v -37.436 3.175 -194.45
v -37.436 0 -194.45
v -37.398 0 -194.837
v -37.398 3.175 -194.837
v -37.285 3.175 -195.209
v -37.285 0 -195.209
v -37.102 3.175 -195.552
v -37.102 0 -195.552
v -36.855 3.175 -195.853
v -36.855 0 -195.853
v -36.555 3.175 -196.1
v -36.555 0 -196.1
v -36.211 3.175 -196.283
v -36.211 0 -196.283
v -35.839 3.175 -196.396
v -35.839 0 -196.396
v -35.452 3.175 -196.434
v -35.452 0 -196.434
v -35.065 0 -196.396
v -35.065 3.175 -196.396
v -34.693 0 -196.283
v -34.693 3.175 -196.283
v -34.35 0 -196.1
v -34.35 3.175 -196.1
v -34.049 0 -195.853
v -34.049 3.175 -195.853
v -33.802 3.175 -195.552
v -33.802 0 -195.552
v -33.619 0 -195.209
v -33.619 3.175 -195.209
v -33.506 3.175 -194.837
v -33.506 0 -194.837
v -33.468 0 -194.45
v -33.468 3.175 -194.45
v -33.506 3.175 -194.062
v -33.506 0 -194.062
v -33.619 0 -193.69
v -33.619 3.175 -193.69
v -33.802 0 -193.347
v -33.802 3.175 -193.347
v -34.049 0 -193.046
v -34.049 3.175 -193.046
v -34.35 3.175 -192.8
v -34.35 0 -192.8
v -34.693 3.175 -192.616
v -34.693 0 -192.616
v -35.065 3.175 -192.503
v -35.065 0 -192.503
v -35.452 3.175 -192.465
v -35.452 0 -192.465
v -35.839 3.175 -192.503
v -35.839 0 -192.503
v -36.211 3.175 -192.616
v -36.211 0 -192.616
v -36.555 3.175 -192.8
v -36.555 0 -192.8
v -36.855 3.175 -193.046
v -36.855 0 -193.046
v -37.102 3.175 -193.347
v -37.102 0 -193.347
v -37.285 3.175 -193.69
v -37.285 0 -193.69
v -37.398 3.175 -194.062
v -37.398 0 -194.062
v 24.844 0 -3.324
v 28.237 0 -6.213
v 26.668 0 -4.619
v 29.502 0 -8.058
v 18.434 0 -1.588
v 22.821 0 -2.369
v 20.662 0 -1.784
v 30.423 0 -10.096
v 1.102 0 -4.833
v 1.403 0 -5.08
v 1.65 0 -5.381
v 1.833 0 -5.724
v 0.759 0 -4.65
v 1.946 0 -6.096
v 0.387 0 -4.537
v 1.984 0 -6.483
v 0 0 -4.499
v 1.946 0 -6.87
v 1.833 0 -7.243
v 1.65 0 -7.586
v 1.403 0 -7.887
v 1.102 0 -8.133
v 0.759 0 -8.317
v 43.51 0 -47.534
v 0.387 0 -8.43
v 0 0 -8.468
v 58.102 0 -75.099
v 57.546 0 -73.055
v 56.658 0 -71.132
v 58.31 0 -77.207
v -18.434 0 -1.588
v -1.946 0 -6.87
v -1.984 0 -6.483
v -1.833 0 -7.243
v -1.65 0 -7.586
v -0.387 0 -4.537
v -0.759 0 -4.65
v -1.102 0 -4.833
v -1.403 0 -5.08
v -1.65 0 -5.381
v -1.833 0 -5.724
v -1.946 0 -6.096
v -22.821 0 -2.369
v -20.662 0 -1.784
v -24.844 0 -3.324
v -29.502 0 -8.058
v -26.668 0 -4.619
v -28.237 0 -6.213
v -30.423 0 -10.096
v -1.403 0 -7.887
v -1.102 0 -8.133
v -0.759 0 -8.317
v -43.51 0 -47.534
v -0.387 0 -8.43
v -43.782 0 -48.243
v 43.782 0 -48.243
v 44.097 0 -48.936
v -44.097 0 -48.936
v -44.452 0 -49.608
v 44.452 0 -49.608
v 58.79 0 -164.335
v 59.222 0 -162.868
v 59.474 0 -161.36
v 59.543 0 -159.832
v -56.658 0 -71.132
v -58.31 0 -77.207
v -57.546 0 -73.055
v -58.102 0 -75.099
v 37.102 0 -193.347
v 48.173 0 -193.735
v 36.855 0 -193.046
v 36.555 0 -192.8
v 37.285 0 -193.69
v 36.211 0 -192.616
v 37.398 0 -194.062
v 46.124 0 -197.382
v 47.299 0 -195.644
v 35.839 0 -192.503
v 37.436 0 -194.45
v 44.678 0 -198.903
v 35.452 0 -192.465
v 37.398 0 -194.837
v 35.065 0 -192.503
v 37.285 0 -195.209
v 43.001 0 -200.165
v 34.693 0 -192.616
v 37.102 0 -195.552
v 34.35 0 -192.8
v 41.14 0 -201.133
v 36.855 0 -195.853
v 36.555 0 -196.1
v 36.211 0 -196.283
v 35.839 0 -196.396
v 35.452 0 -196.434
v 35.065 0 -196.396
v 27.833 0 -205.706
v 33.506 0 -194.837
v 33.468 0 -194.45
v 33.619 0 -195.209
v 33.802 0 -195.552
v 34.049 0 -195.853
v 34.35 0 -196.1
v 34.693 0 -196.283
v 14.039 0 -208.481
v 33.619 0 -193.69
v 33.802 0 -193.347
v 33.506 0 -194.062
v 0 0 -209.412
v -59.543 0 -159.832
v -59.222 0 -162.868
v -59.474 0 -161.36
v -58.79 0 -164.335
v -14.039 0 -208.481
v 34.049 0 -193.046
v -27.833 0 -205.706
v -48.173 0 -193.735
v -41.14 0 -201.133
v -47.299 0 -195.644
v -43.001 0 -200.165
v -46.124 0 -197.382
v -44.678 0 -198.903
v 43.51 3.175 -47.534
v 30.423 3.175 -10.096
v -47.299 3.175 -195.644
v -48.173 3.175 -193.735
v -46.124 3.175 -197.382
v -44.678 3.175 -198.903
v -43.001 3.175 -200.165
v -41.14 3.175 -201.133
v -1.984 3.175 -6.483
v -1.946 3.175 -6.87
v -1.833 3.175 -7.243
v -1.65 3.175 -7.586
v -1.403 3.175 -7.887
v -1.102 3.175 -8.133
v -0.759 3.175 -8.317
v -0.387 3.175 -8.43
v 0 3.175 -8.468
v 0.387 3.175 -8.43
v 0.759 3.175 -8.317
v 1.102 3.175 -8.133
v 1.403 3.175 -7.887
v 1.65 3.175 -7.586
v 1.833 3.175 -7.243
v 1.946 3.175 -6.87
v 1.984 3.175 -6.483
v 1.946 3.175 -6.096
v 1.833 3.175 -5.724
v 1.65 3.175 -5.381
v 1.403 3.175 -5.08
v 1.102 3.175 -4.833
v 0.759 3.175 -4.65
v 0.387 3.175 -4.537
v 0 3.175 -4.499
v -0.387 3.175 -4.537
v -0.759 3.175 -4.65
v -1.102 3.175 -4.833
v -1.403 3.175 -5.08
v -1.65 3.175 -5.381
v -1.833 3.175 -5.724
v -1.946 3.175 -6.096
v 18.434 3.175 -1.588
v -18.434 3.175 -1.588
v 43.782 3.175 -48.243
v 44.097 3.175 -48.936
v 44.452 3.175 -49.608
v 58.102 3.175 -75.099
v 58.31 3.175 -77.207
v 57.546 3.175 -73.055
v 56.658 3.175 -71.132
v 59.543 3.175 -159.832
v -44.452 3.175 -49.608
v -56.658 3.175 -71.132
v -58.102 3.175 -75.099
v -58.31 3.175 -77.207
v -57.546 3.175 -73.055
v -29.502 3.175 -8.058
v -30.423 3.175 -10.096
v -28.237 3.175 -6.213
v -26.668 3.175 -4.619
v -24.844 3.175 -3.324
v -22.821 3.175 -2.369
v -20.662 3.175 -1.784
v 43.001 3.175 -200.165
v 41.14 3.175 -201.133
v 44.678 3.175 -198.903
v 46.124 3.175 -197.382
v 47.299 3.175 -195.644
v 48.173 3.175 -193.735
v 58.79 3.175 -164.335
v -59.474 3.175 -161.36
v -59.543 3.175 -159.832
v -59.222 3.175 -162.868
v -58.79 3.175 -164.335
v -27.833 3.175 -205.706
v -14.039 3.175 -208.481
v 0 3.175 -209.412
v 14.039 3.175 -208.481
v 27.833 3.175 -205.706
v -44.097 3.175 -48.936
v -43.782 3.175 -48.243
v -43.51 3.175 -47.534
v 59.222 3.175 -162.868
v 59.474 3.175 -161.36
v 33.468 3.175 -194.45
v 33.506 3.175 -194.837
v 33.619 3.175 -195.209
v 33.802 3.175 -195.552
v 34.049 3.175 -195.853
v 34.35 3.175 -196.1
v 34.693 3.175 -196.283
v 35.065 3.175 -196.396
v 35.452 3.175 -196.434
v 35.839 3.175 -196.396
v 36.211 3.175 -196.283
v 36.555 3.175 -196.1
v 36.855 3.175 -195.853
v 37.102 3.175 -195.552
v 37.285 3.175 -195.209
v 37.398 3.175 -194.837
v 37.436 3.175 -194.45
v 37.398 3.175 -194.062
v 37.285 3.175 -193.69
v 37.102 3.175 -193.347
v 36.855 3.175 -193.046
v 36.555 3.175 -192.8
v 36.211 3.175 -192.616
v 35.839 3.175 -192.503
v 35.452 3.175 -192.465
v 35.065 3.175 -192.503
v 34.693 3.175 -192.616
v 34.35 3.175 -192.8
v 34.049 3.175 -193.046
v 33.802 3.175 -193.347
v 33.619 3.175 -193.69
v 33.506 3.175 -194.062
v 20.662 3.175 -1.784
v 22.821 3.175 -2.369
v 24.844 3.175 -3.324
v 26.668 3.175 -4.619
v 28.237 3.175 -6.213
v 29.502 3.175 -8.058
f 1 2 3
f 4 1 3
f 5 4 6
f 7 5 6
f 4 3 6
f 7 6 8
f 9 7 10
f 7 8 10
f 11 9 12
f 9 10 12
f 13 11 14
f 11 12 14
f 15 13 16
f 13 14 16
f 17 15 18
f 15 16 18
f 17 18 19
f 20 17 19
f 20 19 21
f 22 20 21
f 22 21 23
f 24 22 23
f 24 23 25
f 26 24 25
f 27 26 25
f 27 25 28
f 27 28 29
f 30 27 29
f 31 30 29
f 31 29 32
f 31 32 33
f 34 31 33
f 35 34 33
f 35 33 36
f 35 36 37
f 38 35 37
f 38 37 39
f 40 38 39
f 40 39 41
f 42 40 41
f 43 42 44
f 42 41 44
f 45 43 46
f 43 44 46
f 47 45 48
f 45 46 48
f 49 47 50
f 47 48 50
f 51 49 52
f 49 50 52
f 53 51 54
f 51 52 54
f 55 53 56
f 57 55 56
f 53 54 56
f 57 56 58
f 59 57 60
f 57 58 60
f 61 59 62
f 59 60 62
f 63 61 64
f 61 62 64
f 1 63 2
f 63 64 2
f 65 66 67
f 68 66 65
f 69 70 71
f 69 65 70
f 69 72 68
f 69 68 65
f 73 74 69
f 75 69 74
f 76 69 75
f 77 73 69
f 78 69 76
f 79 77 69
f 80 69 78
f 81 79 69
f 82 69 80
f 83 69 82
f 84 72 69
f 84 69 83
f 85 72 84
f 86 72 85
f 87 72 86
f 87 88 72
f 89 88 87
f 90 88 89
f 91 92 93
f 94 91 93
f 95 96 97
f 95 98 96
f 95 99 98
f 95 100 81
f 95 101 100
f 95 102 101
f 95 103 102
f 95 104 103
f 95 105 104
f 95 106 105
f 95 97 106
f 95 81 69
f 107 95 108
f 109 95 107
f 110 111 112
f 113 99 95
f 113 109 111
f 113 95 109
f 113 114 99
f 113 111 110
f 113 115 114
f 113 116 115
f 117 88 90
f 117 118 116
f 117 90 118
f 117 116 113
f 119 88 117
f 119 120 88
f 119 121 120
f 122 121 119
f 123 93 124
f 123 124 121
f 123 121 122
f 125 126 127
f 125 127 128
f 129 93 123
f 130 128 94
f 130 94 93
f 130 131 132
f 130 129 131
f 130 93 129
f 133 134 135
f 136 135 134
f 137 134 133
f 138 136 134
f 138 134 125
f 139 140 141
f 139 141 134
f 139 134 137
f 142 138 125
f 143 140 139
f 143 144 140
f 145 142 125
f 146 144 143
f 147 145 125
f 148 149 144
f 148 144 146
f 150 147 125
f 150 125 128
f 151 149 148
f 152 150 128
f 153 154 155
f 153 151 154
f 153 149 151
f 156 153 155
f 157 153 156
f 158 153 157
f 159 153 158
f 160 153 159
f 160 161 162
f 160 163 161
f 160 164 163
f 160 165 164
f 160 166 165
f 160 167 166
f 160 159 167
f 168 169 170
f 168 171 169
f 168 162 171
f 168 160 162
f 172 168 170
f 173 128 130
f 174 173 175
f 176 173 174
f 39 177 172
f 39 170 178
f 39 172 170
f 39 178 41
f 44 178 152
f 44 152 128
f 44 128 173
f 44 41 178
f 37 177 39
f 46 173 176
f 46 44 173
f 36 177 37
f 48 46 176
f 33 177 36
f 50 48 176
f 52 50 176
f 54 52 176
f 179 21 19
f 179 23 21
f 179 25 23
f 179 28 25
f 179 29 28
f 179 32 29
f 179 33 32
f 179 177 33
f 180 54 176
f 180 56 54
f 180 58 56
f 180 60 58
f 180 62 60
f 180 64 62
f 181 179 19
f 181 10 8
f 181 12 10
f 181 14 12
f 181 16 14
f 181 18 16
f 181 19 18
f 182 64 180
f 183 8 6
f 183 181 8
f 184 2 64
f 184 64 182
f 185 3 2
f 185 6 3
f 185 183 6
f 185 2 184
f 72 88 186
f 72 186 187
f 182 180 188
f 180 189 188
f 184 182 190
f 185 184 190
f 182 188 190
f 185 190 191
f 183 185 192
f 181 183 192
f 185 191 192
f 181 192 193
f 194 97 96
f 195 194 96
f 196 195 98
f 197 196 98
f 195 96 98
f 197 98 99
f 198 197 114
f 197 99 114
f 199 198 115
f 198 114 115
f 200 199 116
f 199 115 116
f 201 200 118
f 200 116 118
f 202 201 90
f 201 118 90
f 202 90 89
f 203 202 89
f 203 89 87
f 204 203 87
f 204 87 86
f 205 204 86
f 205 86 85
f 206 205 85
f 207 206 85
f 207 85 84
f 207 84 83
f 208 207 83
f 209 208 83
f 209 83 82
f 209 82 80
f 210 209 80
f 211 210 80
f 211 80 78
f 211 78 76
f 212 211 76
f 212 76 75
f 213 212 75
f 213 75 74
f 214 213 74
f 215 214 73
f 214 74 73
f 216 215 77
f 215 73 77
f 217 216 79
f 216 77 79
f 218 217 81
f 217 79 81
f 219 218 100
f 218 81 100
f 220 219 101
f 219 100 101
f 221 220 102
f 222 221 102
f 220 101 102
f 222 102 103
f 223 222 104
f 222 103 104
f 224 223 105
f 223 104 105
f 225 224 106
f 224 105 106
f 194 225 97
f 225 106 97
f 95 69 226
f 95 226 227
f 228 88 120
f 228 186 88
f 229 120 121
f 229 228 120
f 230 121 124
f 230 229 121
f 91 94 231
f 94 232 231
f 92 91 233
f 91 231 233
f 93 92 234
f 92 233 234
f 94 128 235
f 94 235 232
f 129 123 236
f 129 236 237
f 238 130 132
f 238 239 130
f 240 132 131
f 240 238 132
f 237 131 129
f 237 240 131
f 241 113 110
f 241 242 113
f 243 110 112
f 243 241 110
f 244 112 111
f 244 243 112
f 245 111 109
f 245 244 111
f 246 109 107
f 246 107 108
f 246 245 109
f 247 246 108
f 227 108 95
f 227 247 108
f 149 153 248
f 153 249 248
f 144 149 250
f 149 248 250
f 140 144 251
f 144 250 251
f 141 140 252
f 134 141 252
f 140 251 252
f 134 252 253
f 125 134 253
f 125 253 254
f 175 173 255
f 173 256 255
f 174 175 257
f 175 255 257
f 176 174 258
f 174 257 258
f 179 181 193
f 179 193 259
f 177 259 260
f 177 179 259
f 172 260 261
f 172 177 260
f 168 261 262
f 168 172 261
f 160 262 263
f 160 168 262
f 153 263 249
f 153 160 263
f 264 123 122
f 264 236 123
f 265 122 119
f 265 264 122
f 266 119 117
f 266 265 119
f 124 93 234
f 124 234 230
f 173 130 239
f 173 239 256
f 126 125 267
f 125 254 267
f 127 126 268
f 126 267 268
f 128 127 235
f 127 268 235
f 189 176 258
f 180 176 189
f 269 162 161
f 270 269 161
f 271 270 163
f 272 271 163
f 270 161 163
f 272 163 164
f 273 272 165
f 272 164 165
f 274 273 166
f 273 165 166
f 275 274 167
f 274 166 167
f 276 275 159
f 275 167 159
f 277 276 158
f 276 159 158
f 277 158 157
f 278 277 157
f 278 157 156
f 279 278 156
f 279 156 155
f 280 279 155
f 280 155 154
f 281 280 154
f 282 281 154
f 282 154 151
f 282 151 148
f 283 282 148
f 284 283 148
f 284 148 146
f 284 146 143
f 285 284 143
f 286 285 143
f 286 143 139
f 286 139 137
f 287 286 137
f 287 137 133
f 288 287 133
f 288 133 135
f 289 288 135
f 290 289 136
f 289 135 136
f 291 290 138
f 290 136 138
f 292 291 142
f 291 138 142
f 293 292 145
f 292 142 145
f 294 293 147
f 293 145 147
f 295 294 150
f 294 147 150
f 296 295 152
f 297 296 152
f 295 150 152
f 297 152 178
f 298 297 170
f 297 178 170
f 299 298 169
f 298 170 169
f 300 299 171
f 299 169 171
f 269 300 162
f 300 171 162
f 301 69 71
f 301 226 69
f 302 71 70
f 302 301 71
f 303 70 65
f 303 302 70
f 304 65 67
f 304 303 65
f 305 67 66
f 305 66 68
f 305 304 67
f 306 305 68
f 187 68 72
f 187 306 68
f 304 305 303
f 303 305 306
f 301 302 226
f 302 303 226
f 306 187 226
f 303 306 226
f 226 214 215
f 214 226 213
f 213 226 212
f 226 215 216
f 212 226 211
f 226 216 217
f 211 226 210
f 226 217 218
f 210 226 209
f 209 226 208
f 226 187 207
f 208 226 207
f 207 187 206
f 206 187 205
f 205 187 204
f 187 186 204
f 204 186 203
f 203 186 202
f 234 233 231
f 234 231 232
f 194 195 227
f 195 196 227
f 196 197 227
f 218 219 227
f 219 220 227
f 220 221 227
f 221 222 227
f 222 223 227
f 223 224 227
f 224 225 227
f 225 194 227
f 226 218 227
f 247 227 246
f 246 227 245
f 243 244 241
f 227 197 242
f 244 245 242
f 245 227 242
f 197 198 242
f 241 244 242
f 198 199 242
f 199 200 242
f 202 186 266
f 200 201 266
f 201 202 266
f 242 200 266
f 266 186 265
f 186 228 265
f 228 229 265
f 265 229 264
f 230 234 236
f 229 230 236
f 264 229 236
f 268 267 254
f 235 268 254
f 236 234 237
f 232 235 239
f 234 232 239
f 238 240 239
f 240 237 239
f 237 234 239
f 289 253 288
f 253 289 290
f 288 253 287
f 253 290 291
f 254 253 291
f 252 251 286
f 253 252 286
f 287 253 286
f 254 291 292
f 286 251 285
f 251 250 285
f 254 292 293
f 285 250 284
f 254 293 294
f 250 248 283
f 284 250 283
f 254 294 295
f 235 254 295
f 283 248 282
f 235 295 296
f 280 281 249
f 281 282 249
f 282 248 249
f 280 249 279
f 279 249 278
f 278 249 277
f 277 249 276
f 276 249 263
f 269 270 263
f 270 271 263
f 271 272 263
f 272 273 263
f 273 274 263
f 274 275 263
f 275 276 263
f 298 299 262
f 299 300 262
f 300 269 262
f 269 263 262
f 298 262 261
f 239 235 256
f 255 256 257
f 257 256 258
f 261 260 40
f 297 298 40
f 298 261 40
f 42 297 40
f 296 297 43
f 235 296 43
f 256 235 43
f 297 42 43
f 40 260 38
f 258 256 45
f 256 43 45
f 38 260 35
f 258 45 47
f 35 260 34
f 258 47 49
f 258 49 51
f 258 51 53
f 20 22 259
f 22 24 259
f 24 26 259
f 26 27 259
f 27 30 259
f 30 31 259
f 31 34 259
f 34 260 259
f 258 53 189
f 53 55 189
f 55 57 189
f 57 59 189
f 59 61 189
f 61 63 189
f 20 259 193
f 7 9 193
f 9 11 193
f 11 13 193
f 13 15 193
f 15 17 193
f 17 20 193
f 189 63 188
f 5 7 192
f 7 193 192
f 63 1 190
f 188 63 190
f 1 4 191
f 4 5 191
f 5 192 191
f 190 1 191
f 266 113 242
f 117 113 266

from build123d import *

# Parameters (mm, degrees)
BOSS_EXTRUDE1_DEPTH             = 3.175
F_5_32_0_15625_DIAMETER_HOLE1_D = 3.96875
FILLET1_R                       = 12.7


with BuildPart() as part:
    # Sketch1 → Boss-Extrude1 (new body)
    with BuildSketch(Plane(origin=(0, 0, 0), x_dir=(1, 0, 0), z_dir=(0, 1, 0))):
        with BuildLine():
            Line((-58.261140344, 73.958269638), (-59.57789635, 162.152192036))
            Line((-59.57789635, 162.152192036), (-46.350471986, 198.78134649))
            ThreePointArc((-46.350471986, 198.78134649), (0, 209.411849995), (46.350471986, 198.78134649))
            Line((46.350471986, 198.78134649), (59.57789635, 162.152192036))
            Line((59.57789635, 162.152192036), (58.261140344, 73.958269638))
            Line((58.261140344, 73.958269638), (43.887596105, 48.613026492))
            Line((43.887596105, 48.613026492), (27.448255842, 1.5875))
            Line((27.448255842, 1.5875), (-27.448255842, 1.5875))
            Line((-27.448255842, 1.5875), (-43.887596105, 48.613026492))
            Line((-43.887596105, 48.613026492), (-58.261140344, 73.958269638))
        make_face()
    extrude(amount=BOSS_EXTRUDE1_DEPTH)

    # 5/32 (0.15625) Diameter Hole1 (through all)
    with Locations(Plane(origin=(0, 3.175, 0), x_dir=(1, 0, 0), z_dir=(0, 1, 0))):
        with Locations((0, 6.48335), (-35.45205, 194.449583064), (35.45205, 194.449583064)):
            Hole(F_5_32_0_15625_DIAMETER_HOLE1_D / 2)

    # Fillet1
    fillet1_edges = [part.edges().sort_by_distance(p)[0] for p in [
        (-59.57789635, 1.5875, -162.152192036),
        (-58.261140344, 1.5875, -73.958269638),
        (-43.887596105, 1.5875, -48.613026492),
        (-27.448255842, 1.5875, -1.5875),
        (27.448255842, 1.5875, -1.5875),
        (43.887596105, 1.5875, -48.613026492),
        (58.261140344, 1.5875, -73.958269638),
        (59.57789635, 1.5875, -162.152192036),
        (46.350471986, 1.5875, -198.78134649),
        (-46.350471986, 1.5875, -198.78134649),
    ]]
    fillet(fillet1_edges, radius=FILLET1_R)


solid = part.part
